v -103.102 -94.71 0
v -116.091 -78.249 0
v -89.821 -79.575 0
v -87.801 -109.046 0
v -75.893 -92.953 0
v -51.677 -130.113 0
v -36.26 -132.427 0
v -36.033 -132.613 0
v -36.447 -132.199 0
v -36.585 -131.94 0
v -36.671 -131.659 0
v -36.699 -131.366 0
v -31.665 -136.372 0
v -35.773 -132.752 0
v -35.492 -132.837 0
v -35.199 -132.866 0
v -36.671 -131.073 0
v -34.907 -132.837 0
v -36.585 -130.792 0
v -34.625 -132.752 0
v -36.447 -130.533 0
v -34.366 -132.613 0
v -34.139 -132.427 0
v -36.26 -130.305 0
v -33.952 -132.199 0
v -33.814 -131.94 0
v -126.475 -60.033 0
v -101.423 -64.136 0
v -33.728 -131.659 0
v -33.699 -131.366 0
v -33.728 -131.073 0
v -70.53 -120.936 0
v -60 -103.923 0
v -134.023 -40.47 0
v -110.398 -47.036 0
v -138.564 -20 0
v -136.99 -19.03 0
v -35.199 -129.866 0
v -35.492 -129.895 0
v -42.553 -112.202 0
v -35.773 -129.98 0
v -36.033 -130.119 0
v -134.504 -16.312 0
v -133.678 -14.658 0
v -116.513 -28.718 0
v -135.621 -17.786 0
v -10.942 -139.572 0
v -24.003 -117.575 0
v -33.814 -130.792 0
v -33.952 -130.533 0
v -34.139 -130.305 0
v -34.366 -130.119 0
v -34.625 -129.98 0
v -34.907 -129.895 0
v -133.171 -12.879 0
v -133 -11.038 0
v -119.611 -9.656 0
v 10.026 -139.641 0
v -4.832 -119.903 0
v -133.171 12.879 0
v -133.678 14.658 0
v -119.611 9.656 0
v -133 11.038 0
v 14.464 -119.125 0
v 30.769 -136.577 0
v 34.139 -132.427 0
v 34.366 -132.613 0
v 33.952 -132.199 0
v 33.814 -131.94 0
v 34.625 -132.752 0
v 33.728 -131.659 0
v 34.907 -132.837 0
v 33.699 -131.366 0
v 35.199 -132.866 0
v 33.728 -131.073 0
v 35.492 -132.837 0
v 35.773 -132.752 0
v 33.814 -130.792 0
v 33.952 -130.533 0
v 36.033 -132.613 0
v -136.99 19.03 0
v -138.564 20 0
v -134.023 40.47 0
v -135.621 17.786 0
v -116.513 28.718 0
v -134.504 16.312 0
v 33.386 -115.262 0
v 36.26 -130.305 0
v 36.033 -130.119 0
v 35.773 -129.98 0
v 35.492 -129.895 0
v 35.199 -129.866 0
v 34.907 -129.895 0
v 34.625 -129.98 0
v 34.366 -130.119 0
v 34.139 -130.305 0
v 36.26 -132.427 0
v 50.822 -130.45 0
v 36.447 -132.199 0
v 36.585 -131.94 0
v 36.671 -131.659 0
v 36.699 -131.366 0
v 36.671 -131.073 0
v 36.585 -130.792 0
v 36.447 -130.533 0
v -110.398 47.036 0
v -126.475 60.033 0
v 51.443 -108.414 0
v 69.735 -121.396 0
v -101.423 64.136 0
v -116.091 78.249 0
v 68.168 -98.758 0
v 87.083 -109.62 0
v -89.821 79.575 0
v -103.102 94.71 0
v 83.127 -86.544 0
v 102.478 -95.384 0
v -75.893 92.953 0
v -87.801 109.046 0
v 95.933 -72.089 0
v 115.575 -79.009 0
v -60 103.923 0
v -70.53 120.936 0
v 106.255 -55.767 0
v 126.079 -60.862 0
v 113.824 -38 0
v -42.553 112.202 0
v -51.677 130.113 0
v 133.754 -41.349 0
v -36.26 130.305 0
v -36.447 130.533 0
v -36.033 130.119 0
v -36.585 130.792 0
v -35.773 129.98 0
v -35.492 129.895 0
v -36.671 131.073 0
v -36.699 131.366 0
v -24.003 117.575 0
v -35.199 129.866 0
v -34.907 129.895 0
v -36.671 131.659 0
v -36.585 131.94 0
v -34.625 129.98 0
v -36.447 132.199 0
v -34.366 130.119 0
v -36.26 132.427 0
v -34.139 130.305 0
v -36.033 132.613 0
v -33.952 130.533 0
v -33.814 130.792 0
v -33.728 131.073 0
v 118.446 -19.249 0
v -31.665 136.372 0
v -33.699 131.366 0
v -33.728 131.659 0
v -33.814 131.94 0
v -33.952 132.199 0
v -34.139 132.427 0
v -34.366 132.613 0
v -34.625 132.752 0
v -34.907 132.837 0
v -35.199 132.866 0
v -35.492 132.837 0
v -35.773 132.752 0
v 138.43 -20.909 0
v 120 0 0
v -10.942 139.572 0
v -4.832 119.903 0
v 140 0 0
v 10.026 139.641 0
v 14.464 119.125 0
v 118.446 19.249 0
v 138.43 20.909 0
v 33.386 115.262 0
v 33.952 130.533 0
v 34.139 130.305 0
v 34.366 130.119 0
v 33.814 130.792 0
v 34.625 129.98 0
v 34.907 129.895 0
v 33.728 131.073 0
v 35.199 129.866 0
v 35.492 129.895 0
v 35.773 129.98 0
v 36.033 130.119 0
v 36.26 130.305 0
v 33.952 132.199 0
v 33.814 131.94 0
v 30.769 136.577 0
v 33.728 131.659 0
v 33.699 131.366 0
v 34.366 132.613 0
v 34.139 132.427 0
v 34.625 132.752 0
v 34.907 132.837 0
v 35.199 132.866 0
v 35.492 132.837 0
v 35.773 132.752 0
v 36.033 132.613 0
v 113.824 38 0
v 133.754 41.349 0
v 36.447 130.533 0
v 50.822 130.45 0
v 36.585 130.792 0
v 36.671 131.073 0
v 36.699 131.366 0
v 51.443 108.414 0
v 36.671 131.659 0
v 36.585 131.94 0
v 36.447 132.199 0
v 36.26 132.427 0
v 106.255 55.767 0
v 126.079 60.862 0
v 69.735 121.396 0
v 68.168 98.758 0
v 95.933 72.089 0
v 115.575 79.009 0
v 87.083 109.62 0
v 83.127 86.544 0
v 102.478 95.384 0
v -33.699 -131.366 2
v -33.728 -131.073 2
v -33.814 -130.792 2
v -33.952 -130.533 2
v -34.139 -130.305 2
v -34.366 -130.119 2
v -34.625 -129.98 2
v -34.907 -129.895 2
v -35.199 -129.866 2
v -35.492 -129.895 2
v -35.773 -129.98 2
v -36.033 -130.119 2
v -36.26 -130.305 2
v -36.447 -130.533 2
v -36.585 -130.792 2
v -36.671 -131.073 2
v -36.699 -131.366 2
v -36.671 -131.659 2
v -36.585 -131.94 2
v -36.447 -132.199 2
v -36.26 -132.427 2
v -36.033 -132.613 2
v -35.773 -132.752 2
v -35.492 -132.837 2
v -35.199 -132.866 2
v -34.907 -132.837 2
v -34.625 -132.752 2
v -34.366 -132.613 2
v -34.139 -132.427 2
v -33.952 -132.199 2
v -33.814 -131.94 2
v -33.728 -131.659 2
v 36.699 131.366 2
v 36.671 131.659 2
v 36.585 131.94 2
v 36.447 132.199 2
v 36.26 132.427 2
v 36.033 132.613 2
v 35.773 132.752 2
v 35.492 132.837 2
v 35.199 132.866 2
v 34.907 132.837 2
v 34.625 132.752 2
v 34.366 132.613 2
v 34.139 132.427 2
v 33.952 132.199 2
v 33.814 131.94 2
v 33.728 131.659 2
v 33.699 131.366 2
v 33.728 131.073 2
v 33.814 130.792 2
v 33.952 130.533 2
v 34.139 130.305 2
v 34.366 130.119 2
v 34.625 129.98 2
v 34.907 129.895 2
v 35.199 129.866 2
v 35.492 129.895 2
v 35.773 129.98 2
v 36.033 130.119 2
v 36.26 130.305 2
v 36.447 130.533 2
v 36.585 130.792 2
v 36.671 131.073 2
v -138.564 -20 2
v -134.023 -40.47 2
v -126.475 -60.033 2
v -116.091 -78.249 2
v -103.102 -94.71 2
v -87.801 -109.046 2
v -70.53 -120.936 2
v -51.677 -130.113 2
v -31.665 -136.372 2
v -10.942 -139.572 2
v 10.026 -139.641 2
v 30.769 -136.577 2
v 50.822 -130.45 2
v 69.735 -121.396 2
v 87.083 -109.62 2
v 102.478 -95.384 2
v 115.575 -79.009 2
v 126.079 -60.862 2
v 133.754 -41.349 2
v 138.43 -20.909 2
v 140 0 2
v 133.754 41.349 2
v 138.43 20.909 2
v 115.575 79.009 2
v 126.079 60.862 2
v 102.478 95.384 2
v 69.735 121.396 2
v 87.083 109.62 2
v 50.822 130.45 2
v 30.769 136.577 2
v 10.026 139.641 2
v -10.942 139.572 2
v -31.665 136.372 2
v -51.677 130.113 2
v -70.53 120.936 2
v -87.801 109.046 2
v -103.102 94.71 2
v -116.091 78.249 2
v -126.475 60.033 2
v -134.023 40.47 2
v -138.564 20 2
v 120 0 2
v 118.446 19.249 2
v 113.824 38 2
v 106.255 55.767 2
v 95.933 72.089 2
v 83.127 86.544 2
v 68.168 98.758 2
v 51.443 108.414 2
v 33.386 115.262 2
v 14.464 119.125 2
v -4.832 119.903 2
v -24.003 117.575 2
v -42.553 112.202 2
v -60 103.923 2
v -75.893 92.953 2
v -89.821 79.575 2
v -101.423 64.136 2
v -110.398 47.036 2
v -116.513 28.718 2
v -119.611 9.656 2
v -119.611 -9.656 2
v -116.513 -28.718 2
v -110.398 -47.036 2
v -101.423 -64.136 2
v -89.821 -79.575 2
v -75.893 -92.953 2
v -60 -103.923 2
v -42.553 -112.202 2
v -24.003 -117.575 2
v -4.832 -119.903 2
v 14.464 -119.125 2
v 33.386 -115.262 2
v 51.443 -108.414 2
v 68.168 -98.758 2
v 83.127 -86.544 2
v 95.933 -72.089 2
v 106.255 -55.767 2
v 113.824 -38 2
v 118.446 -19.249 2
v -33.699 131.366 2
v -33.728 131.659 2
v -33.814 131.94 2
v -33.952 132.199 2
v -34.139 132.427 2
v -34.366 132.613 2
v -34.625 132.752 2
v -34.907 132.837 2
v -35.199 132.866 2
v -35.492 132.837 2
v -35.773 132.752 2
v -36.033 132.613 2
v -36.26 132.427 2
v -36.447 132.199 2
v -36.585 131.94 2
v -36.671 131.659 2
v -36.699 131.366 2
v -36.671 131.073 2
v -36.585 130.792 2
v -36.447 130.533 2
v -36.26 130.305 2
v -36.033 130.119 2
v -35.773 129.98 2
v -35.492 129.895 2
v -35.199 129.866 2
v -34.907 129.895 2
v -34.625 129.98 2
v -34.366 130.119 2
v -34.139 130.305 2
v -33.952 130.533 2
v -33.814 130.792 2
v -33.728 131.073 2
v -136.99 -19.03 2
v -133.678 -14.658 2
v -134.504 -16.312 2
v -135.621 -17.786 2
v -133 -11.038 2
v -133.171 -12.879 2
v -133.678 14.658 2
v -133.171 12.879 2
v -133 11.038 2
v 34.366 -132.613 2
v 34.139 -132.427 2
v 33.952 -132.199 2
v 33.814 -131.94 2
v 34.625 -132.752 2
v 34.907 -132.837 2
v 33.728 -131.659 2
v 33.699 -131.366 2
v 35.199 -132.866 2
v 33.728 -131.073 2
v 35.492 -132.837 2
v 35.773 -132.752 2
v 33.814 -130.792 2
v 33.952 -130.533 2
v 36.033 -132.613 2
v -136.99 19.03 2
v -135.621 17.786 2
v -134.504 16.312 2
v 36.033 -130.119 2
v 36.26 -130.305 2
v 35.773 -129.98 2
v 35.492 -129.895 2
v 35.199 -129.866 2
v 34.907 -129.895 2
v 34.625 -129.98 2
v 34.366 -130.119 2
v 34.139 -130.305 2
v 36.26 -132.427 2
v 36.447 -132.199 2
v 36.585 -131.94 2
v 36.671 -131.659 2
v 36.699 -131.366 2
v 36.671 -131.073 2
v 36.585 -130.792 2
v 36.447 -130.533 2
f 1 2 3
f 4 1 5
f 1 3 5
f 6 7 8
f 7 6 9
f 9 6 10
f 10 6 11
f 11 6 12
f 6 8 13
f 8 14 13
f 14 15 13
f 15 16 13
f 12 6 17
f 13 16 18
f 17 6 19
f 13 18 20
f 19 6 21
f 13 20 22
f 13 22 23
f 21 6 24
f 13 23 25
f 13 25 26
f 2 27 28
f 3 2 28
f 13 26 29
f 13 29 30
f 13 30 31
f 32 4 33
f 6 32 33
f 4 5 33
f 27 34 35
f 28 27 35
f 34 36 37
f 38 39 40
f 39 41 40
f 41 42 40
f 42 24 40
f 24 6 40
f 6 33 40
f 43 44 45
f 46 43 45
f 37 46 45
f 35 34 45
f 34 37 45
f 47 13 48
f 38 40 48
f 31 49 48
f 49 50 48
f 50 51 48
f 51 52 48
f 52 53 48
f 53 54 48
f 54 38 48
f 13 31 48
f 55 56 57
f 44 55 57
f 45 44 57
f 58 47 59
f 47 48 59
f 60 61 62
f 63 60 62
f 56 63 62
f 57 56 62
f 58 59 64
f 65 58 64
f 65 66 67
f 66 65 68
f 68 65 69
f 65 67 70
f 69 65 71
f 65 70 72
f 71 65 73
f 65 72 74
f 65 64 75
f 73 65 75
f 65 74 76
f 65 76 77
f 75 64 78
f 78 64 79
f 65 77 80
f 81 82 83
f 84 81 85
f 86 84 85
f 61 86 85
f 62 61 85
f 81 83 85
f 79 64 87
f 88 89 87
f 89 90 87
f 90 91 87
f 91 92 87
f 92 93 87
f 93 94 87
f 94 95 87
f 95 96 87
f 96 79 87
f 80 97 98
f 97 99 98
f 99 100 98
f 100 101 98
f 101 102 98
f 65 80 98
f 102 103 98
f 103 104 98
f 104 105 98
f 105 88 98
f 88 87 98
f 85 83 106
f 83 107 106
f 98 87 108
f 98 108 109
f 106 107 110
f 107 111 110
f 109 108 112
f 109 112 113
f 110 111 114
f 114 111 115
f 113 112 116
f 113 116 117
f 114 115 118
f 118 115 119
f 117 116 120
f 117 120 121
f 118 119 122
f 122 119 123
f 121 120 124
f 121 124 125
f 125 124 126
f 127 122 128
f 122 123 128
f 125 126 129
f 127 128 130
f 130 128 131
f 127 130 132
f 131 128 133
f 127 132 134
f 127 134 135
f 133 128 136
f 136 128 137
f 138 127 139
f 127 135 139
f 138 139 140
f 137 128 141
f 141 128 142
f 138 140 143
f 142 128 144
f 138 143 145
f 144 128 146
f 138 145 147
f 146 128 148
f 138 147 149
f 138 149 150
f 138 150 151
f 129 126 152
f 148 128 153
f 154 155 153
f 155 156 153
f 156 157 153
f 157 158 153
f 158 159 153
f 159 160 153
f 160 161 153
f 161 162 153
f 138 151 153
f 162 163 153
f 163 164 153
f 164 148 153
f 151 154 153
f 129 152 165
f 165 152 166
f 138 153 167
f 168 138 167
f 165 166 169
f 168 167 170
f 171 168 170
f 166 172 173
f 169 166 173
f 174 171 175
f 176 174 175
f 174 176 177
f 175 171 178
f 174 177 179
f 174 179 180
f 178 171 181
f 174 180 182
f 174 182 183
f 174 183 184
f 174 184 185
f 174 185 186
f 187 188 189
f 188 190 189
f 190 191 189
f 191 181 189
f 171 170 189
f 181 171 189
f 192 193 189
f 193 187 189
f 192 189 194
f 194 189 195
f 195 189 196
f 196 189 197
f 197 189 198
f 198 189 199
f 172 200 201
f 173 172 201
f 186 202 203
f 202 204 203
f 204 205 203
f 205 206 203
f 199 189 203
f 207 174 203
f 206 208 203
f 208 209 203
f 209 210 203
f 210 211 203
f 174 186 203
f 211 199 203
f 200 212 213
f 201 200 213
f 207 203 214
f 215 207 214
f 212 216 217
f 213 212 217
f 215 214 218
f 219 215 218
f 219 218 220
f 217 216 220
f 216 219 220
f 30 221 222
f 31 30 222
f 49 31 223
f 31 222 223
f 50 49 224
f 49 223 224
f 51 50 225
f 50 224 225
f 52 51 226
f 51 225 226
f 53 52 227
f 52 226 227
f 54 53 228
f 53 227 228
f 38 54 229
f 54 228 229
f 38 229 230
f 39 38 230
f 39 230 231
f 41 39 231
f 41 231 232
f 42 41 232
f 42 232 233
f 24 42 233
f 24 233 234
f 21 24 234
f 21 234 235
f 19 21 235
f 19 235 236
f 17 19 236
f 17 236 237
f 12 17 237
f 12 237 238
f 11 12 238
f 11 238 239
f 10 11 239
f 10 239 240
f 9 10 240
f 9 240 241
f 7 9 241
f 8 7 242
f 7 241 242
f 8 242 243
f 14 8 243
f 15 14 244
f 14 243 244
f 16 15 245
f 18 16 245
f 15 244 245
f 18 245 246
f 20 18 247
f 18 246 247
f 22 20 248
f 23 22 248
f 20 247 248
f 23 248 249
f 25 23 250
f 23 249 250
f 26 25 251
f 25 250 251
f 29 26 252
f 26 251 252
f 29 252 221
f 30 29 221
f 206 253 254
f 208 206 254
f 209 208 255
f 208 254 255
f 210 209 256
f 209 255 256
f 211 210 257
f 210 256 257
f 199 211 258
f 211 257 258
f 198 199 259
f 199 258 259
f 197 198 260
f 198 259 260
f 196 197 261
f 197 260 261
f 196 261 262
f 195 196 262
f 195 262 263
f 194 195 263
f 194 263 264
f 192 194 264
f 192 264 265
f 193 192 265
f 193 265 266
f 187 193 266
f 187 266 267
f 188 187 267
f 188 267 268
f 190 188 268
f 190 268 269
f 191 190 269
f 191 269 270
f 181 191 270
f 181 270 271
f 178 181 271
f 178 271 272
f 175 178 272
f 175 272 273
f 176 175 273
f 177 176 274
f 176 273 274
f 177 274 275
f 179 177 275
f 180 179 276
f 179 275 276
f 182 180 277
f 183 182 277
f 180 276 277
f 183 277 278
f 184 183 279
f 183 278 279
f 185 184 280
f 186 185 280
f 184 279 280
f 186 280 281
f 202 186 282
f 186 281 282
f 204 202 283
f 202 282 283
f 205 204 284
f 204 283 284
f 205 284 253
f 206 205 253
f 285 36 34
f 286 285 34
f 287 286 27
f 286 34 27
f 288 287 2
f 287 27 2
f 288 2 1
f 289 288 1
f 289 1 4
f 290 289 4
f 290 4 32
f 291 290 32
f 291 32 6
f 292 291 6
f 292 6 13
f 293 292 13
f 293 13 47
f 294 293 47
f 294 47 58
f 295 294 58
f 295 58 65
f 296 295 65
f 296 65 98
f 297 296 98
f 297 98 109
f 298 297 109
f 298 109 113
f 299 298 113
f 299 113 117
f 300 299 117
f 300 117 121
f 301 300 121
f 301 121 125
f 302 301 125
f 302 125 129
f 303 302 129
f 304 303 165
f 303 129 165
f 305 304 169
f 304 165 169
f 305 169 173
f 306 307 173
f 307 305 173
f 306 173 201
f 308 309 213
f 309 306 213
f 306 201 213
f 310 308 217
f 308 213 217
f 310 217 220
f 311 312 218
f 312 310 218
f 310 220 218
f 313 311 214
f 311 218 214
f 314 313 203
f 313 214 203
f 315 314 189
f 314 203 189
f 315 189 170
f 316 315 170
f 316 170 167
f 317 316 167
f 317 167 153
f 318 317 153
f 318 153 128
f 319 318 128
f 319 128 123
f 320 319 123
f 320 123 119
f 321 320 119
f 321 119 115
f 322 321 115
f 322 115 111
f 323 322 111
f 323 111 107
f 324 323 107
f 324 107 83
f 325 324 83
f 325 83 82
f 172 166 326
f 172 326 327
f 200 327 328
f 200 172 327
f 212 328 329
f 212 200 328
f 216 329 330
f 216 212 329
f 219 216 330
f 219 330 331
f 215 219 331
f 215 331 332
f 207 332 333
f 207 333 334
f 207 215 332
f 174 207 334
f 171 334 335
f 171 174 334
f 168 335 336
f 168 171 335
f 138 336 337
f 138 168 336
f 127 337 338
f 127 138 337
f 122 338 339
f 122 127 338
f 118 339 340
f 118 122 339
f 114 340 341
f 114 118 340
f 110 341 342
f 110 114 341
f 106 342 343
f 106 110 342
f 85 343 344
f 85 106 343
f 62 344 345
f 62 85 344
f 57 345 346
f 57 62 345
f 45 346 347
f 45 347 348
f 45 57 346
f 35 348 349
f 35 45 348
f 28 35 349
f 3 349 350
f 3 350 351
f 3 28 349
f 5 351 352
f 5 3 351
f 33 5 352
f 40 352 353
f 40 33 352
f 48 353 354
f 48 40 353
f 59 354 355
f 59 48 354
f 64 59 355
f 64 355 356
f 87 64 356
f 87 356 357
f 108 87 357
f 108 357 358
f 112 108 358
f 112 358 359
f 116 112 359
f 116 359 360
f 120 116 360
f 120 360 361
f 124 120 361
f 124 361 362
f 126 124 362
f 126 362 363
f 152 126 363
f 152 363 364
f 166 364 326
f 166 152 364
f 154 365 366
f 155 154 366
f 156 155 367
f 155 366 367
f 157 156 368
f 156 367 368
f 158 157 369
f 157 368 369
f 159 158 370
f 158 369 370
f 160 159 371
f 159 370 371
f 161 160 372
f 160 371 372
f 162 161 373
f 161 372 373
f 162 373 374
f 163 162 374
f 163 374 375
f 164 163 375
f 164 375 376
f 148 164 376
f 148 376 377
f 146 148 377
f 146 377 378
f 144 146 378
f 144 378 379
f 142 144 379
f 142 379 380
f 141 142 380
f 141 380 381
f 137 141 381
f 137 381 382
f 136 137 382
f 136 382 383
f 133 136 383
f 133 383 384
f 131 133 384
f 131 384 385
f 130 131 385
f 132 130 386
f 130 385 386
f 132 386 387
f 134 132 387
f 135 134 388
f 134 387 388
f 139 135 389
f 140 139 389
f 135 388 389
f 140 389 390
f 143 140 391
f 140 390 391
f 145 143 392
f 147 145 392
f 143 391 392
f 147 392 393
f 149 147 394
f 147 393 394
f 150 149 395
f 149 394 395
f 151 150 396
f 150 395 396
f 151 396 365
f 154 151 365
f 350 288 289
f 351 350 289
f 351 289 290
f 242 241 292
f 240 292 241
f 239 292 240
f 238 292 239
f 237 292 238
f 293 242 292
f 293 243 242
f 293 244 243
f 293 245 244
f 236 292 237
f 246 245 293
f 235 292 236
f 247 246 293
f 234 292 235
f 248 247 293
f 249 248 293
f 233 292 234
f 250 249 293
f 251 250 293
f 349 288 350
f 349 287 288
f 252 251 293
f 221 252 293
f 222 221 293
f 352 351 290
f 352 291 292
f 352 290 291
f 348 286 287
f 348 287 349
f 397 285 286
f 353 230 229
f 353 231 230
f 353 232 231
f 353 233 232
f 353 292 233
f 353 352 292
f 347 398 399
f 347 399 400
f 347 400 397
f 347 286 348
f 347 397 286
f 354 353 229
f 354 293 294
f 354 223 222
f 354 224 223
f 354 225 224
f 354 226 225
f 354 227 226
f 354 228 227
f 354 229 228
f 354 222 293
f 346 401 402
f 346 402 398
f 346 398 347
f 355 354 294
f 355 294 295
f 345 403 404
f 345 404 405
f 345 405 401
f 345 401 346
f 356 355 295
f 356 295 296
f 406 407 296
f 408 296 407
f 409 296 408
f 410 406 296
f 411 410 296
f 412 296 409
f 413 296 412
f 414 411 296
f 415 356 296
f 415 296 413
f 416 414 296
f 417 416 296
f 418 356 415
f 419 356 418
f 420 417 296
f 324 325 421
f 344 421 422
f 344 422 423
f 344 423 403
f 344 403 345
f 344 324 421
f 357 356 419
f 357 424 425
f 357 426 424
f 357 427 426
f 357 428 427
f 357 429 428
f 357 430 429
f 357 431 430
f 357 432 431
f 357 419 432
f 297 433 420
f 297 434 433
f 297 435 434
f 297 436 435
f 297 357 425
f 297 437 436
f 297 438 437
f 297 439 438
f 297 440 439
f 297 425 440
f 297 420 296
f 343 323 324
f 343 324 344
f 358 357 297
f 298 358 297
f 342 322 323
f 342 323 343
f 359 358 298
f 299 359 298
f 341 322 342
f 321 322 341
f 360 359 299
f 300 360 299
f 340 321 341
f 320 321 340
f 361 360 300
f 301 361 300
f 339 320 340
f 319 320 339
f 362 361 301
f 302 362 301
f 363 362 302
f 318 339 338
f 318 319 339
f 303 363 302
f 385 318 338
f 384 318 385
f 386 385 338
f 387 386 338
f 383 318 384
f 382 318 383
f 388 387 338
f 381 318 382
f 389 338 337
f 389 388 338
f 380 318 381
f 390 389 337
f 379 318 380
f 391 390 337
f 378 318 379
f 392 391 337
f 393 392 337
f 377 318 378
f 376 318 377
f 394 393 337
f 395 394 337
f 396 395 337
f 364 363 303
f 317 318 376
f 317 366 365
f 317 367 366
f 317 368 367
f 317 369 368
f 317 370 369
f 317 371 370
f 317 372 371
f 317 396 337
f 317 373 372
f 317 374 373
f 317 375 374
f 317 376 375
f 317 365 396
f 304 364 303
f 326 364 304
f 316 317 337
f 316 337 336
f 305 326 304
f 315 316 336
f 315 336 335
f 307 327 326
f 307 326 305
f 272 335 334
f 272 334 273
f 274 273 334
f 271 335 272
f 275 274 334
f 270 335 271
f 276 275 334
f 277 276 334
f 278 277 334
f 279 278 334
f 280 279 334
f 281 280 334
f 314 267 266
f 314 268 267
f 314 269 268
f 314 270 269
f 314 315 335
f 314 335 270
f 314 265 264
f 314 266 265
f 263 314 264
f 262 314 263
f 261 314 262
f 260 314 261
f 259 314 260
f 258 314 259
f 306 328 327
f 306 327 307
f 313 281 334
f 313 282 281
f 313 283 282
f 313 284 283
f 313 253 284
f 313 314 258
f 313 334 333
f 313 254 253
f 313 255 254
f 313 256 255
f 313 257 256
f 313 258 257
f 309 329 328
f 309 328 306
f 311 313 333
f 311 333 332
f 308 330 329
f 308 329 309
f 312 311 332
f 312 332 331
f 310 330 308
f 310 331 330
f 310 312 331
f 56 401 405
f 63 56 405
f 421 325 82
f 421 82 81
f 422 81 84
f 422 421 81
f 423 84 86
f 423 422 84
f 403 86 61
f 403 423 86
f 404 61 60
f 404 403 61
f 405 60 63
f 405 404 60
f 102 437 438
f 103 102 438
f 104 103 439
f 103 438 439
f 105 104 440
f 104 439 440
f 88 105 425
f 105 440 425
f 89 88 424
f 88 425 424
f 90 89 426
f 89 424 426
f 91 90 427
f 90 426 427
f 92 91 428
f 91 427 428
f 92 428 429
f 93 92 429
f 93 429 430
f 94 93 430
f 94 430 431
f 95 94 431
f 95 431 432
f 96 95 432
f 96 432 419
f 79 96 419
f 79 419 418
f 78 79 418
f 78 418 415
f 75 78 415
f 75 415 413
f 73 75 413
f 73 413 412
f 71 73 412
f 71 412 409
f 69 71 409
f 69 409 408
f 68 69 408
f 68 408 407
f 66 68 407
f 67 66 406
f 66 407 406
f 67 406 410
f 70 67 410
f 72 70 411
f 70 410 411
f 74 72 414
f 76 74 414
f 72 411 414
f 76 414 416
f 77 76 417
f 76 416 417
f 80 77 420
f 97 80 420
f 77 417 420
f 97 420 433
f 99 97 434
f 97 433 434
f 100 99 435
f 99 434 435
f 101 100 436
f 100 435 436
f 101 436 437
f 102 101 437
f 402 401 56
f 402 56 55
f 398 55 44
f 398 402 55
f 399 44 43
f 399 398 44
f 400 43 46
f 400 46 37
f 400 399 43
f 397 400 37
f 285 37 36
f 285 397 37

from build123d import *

# Parameters (mm, degrees)
ESQUISSE1_R             = 140
ESQUISSE1_R_2           = 120
BOSS_EXTRU_1_DEPTH      = 2
ENL_V_MAT_EXTRU_1_REACH = 200
ESQUISSE2_W             = 10
ESQUISSE2_H             = 40
ESQUISSE4_W             = 11.636908411
ESQUISSE4_H             = 60
BOSS_EXTRU_2_DEPTH      = 2
CONG_1_R                = 10
ENL_V_MAT_EXTRU_2_REACH = 200
ESQUISSE5_R             = 1.5


with BuildPart() as part:
    # Esquisse1 → Boss.-Extru.1 (new body)
    with BuildSketch(Plane.XY):
        Circle(ESQUISSE1_R)
        Circle(ESQUISSE1_R_2, mode=Mode.SUBTRACT)
    extrude(amount=BOSS_EXTRU_1_DEPTH)

    # Esquisse2 → Enlèv. mat.-Extru.1 (cut, up to next)
    with BuildSketch(Plane.XY.offset(2), mode=Mode.PRIVATE) as enl_v_mat_extru_1_sk1:
        with Locations((-138, 0)):
            Rectangle(ESQUISSE2_W, ESQUISSE2_H)
    enl_v_mat_extru_1_tool1 = extrude(enl_v_mat_extru_1_sk1.sketch, amount=-ENL_V_MAT_EXTRU_1_REACH, mode=Mode.PRIVATE) & part.part
    add(enl_v_mat_extru_1_tool1.solids().sort_by_distance((-138, 0, 2))[0], mode=Mode.SUBTRACT)

    # Esquisse4 → Boss.-Extru.2 (add)
    with BuildSketch(Plane.XY.offset(2)):
        with Locations((-127.181545795, 10)):
            Rectangle(ESQUISSE4_W, ESQUISSE4_H)
    extrude(amount=-BOSS_EXTRU_2_DEPTH)

    # Congé1
    # the kernel refuses this fillet: 10 mm, written as the material it adds along each edge
    with BuildSketch(Plane(origin=(-133, -20, 2), x_dir=(-1, 0, 0), z_dir=(0, 0, -1))) as cong_1_piece_1:
        with BuildLine():
            CenterArc((10, 8.962280802), CONG_1_R, 180, 63.666611113)
            Line((0, 8.962280802), (-0.2, 8.962280802))
            Line((-0.2, 8.962280802), (-0.2, 0))
            Line((-0.2, 0), (0, -0.2))
            ThreePointArc((0, -0.2), (2.782032303, -0.2), (5.475345898, -0.179245616))
            Line((5.475345898, -0.179245616), (5.564064606, 0))
        make_face()
    extrude(amount=2)
    with BuildSketch(Plane(origin=(-133, 20, 2), x_dir=(-1, 0, 0), z_dir=(0, 0, -1))) as cong_1_piece_2:
        with BuildLine():
            CenterArc((10, -8.962280802), CONG_1_R, 116.333388887, 63.666611113)
            Line((0, -8.962280802), (-0.2, -8.962280802))
            Line((-0.2, -8.962280802), (-0.2, 0))
            Line((-0.2, 0), (0, 0.2))
            ThreePointArc((0, 0.2), (2.782032303, 0.2), (5.475345898, 0.179245616))
            Line((5.475345898, 0.179245616), (5.564064606, 0))
        make_face()
    extrude(amount=2)

    # Esquisse5 → Enlèv. mat.-Extru.2 (cut, up to next)
    with BuildSketch(Plane.XY.offset(2), mode=Mode.PRIVATE) as enl_v_mat_extru_2_sk1:
        with Locations((-35.199390134, -131.365912375)):
            Circle(ESQUISSE5_R)
    enl_v_mat_extru_2_tool1 = extrude(enl_v_mat_extru_2_sk1.sketch, amount=-ENL_V_MAT_EXTRU_2_REACH, mode=Mode.PRIVATE) & part.part
    # Esquisse5 → Enlèv. mat.-Extru.2 (cut, up to next)
    with BuildSketch(Plane.XY.offset(2), mode=Mode.PRIVATE) as enl_v_mat_extru_2_sk2:
        with Locations((35.199390134, -131.365912375)):
            Circle(ESQUISSE5_R)
    enl_v_mat_extru_2_tool2 = extrude(enl_v_mat_extru_2_sk2.sketch, amount=-ENL_V_MAT_EXTRU_2_REACH, mode=Mode.PRIVATE) & part.part
    # Esquisse5 → Enlèv. mat.-Extru.2 (cut, up to next)
    with BuildSketch(Plane.XY.offset(2), mode=Mode.PRIVATE) as enl_v_mat_extru_2_sk3:
        with Locations((-35.199390134, 131.365912375)):
            Circle(ESQUISSE5_R)
    enl_v_mat_extru_2_tool3 = extrude(enl_v_mat_extru_2_sk3.sketch, amount=-ENL_V_MAT_EXTRU_2_REACH, mode=Mode.PRIVATE) & part.part
    # Esquisse5 → Enlèv. mat.-Extru.2 (cut, up to next)
    with BuildSketch(Plane.XY.offset(2), mode=Mode.PRIVATE) as enl_v_mat_extru_2_sk4:
        with Locations((35.199390134, 131.365912375)):
            Circle(ESQUISSE5_R)
    enl_v_mat_extru_2_tool4 = extrude(enl_v_mat_extru_2_sk4.sketch, amount=-ENL_V_MAT_EXTRU_2_REACH, mode=Mode.PRIVATE) & part.part
    add(enl_v_mat_extru_2_tool1.solids().sort_by_distance((-35.19939, -131.365912, 2))[0], mode=Mode.SUBTRACT)
    add(enl_v_mat_extru_2_tool2.solids().sort_by_distance((35.19939, -131.365912, 2))[0], mode=Mode.SUBTRACT)
    add(enl_v_mat_extru_2_tool3.solids().sort_by_distance((-35.19939, 131.365912, 2))[0], mode=Mode.SUBTRACT)
    add(enl_v_mat_extru_2_tool4.solids().sort_by_distance((35.19939, 131.365912, 2))[0], mode=Mode.SUBTRACT)


solid = part.part
